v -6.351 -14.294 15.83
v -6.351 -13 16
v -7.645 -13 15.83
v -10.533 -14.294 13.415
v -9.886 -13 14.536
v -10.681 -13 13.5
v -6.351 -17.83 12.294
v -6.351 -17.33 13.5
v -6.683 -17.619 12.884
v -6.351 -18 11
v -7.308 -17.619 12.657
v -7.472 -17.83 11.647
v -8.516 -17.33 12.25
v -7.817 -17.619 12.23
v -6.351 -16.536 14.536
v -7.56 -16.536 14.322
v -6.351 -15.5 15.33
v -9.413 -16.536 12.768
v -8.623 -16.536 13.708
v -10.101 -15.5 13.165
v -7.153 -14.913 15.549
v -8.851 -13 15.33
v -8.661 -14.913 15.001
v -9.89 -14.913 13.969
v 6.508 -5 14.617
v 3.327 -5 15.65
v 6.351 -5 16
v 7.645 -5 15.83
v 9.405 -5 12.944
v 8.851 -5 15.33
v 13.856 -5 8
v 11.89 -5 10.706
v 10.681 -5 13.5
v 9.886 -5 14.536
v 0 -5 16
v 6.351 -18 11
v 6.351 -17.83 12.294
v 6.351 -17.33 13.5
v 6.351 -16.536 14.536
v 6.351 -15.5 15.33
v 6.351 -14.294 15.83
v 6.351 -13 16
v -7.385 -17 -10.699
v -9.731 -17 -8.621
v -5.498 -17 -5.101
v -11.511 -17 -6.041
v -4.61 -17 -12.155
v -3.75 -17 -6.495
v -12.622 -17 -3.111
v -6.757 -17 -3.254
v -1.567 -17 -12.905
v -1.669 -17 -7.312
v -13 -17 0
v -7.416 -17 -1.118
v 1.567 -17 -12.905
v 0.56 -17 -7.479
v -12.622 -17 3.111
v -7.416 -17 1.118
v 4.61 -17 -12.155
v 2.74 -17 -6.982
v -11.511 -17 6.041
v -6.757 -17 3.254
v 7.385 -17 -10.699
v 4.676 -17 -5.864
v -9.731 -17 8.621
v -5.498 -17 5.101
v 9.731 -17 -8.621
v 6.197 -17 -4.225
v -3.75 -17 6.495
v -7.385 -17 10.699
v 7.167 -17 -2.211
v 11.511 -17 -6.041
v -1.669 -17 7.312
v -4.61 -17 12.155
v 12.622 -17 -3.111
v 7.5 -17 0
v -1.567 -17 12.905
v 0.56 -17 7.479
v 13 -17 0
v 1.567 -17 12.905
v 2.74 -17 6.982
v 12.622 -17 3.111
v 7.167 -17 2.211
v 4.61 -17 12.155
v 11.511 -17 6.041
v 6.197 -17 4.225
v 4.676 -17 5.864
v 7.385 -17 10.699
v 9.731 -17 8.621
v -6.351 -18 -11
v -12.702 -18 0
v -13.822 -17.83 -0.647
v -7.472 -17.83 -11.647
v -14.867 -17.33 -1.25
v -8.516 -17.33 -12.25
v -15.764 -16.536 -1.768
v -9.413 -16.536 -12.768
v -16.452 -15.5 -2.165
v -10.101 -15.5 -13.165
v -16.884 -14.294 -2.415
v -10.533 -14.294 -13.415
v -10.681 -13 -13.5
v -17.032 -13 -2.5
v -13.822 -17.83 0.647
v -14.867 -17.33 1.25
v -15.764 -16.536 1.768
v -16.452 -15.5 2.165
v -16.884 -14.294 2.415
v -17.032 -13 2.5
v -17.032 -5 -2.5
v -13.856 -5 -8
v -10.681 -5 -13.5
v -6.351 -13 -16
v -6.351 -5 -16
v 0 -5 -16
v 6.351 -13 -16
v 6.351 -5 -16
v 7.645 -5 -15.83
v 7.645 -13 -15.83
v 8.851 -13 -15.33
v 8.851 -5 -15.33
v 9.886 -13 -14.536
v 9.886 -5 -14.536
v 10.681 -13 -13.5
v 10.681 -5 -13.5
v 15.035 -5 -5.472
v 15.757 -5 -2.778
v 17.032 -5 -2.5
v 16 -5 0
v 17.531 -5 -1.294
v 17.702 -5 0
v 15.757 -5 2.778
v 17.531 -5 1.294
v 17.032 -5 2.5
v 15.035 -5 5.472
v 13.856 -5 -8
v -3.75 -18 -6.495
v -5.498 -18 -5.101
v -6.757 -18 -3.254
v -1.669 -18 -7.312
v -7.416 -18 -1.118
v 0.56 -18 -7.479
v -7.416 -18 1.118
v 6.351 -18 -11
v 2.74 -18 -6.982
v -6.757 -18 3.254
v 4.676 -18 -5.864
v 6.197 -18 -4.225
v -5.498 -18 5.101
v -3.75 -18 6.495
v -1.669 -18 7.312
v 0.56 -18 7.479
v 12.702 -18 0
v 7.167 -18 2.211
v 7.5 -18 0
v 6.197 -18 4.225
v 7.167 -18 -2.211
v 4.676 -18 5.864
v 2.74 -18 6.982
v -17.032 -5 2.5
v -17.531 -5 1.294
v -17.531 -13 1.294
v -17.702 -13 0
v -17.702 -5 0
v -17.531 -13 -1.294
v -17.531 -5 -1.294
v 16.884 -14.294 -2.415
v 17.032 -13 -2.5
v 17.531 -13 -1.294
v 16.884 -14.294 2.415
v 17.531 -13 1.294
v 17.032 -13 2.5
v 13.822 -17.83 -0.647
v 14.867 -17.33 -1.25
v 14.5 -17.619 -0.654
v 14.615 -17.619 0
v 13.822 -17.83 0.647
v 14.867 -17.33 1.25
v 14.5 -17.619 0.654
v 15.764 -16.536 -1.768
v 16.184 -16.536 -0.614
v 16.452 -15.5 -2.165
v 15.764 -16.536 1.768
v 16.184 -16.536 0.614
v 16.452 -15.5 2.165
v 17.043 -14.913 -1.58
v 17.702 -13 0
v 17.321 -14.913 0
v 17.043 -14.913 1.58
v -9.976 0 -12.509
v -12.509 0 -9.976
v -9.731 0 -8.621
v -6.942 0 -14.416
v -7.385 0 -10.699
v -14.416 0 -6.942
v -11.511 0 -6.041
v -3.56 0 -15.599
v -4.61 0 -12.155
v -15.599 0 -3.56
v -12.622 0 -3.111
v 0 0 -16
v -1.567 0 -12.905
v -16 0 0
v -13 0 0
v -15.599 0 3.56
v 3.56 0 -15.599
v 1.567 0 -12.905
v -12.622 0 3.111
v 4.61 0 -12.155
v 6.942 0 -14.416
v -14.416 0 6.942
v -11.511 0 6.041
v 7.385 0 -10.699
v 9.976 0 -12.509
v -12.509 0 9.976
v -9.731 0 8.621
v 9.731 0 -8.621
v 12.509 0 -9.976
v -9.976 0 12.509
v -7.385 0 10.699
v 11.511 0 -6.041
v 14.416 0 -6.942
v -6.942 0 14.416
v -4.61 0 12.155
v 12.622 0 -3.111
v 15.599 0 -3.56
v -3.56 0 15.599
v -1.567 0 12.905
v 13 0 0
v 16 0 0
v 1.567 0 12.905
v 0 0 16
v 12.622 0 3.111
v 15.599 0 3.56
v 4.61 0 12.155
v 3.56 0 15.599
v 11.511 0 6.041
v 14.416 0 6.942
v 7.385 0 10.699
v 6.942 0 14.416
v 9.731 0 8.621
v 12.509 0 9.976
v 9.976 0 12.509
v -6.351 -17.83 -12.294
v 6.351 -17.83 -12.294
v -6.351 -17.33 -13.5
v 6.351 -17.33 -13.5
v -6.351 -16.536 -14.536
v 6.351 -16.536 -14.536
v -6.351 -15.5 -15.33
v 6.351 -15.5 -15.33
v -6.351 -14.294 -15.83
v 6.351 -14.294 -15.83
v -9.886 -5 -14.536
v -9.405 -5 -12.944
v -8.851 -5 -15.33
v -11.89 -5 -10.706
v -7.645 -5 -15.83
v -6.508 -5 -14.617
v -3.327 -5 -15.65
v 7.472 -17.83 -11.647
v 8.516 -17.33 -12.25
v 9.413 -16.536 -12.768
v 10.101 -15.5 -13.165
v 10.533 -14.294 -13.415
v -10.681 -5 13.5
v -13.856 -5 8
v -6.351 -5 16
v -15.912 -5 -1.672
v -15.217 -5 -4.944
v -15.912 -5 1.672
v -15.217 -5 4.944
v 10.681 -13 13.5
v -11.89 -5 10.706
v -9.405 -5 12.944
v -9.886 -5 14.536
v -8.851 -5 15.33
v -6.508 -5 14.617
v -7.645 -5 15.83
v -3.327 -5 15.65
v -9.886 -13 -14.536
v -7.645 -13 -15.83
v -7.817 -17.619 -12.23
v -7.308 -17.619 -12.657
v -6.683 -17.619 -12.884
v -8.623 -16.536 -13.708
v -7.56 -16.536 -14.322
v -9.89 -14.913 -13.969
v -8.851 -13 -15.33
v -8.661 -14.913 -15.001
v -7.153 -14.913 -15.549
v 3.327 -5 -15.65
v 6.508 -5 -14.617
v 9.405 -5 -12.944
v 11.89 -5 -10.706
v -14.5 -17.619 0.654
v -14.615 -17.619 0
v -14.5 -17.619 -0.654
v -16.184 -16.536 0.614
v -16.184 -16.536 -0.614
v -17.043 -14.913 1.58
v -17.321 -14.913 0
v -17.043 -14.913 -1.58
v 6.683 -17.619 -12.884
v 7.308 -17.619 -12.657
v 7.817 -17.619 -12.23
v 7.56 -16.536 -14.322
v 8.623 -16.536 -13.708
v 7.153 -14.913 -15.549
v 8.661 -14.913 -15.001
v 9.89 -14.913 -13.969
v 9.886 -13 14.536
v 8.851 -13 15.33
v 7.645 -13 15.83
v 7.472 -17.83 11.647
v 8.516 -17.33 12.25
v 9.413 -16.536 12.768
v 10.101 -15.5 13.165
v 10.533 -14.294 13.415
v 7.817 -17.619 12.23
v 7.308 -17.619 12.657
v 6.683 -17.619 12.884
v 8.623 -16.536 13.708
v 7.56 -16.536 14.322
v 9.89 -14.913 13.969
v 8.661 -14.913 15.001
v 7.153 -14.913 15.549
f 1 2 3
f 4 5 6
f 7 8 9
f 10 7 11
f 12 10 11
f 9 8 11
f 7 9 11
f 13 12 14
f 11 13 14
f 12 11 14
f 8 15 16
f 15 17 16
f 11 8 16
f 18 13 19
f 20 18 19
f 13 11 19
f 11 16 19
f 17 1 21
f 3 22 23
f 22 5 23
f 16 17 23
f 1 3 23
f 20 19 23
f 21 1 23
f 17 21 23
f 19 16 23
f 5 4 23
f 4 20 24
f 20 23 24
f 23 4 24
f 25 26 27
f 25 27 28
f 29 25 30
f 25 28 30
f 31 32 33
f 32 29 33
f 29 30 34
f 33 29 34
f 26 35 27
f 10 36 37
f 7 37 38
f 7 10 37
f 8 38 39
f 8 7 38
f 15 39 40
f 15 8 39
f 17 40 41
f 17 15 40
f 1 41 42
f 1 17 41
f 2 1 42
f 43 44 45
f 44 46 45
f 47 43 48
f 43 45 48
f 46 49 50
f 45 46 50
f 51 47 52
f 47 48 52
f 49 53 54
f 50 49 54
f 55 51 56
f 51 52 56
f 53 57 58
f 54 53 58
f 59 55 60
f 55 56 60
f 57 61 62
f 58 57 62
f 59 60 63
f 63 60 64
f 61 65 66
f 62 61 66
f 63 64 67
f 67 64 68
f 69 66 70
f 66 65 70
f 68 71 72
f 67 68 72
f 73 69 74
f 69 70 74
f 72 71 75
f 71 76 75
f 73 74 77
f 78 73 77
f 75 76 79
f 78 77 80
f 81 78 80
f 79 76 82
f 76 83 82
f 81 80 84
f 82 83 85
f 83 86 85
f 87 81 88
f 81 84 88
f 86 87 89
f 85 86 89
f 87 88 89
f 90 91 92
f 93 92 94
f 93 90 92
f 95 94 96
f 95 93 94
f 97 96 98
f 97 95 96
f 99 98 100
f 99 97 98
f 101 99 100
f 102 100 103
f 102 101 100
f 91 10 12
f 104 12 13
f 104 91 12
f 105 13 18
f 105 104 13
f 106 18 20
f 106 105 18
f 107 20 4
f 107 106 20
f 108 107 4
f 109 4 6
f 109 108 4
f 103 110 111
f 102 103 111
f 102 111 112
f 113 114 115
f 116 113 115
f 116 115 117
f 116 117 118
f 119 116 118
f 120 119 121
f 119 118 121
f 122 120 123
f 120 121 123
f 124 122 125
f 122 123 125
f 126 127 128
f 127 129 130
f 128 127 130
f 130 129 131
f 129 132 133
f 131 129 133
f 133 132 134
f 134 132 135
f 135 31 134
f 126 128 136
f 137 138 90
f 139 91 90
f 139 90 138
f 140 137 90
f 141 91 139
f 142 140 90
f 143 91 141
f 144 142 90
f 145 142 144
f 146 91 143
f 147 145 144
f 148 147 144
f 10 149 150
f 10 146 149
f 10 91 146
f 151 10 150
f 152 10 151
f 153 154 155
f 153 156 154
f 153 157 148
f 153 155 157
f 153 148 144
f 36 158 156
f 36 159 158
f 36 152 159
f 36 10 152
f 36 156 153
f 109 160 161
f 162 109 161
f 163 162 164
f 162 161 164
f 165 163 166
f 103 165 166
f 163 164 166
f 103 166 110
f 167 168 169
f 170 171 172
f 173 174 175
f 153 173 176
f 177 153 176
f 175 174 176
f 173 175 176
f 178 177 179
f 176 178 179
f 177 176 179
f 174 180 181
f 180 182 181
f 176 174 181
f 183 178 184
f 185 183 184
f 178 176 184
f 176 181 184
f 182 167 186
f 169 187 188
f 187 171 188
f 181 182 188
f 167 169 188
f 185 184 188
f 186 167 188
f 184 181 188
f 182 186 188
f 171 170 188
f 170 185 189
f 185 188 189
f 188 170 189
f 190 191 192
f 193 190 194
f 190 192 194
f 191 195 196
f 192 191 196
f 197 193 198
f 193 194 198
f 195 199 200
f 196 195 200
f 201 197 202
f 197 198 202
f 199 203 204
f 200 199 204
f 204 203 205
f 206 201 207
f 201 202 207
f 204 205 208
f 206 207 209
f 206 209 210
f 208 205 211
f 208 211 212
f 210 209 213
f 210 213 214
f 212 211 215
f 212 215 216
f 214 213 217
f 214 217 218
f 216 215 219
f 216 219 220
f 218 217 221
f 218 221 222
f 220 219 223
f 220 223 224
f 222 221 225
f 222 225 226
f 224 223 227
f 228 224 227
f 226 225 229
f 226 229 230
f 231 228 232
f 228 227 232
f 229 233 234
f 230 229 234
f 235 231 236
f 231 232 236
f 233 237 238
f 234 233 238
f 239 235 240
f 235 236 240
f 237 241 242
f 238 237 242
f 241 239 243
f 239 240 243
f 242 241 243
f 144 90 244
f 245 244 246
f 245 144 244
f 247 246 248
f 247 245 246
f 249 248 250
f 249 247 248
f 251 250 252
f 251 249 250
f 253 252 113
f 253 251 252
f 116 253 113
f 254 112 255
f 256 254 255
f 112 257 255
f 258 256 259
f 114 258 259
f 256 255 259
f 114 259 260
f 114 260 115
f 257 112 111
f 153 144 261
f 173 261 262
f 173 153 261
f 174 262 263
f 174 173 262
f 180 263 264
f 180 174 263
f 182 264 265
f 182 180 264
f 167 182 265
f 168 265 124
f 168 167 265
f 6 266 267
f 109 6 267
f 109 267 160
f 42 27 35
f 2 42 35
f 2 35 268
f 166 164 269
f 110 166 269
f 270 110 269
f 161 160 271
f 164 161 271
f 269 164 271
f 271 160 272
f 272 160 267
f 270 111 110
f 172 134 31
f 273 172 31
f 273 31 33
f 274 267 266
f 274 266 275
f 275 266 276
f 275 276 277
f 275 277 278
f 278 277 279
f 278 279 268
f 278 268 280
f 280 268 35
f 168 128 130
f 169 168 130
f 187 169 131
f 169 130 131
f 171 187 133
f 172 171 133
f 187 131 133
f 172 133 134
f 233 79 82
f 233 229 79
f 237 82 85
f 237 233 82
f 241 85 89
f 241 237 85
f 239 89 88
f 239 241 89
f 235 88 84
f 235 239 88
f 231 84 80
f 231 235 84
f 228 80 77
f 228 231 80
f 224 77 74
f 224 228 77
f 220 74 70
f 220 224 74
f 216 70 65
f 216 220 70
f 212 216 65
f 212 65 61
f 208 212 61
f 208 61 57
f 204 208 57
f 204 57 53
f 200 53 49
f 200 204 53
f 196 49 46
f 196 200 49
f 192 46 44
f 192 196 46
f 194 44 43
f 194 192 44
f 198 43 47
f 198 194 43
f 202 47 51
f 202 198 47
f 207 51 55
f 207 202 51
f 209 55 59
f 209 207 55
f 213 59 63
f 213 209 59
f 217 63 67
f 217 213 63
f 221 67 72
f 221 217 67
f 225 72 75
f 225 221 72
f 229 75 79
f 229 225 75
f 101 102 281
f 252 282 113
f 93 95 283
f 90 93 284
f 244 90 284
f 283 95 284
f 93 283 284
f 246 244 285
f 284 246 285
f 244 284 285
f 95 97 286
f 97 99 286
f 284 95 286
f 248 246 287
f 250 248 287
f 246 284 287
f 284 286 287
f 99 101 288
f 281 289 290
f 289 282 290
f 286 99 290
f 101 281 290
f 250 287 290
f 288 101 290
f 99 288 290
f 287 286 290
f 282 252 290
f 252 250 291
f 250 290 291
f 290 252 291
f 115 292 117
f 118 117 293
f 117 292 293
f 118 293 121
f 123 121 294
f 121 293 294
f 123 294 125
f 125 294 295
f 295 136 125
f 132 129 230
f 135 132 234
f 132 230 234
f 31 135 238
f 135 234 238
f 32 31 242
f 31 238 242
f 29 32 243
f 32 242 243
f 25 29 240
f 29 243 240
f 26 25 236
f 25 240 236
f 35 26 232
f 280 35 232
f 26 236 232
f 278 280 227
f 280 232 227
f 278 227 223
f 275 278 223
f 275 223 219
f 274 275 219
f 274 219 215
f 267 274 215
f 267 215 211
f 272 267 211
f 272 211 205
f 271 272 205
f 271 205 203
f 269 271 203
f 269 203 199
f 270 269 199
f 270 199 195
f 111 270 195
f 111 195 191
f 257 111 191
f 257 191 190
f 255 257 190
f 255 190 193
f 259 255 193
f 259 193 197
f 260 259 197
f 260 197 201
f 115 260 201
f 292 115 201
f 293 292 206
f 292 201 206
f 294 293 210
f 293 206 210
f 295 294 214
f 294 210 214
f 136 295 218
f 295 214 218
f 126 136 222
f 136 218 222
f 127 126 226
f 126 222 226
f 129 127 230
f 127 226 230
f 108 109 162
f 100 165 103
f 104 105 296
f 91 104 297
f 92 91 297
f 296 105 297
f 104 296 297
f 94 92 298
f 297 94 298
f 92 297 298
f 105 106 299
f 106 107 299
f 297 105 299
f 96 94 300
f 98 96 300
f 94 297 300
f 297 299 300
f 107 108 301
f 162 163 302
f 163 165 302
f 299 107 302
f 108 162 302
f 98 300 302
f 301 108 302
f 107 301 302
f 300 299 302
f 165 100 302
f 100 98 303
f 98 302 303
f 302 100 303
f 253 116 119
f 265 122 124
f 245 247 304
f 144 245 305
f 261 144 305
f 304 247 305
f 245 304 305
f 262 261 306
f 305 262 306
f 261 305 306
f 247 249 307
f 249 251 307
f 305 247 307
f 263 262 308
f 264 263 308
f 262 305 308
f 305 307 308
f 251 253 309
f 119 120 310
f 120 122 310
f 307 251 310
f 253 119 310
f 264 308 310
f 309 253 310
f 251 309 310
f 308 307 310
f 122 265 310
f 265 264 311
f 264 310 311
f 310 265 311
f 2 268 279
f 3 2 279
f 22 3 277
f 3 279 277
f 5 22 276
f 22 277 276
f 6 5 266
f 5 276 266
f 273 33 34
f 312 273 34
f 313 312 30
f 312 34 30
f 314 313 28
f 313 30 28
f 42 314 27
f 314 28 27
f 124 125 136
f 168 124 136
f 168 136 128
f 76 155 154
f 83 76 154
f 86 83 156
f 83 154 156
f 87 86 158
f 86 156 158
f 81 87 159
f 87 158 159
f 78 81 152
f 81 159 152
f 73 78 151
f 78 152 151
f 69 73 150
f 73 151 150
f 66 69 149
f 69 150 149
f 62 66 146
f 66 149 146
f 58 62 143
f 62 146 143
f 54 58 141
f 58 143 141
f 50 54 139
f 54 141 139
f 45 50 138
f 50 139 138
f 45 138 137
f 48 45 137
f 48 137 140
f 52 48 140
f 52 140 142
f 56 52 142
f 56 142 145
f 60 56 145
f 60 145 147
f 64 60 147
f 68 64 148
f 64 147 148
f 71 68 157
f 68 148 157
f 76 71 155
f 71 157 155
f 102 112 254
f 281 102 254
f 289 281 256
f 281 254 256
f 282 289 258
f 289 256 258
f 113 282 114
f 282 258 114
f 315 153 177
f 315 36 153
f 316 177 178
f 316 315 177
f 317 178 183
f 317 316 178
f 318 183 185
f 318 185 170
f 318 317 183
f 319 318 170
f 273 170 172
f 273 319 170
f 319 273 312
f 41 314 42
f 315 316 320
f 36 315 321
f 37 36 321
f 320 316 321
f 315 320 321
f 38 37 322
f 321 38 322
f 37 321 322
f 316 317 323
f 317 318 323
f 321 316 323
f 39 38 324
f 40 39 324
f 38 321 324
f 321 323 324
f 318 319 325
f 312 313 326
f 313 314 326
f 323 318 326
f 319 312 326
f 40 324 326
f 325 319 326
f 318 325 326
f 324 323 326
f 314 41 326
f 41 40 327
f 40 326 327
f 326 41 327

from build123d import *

# Parameters (mm, degrees)
F0_R     = 16
F0_R_2   = 13
F1_DEPTH = 5
F2_R     = 13
F3_DEPTH = 13
F4_R     = 7.5
F5_DEPTH = 1
F6_R     = 5


with BuildPart() as f1:
    # F0 (on Front) → F1 (new body)
    with BuildSketch(Plane.XZ):
        Circle(F0_R)
        Circle(F0_R_2, mode=Mode.SUBTRACT)
    extrude(amount=F1_DEPTH)

    # F2 (on face) → F3 (join)
    with BuildSketch(Plane.XZ.offset(5)):
        with BuildLine():
            Line((6.3508529611, 16), (-6.3508529611, 16))
            ThreePointArc((-6.3508529611, 16), (-8.8508529611, 15.3301270189), (-10.68097998, 13.5))
            Line((-10.68097998, 13.5), (-17.0318329411, 2.5))
            ThreePointArc((-17.0318329411, 2.5), (-17.7017059222, 0), (-17.0318329411, -2.5))
            Line((-17.0318329411, -2.5), (-10.68097998, -13.5))
            ThreePointArc((-10.68097998, -13.5), (-8.8508529611, -15.3301270189), (-6.3508529611, -16))
            Line((-6.3508529611, -16), (6.3508529611, -16))
            ThreePointArc((6.3508529611, -16), (8.8508529611, -15.3301270189), (10.68097998, -13.5))
            Line((10.68097998, -13.5), (17.0318329411, -2.5))
            ThreePointArc((17.0318329411, -2.5), (17.7017059222, 0), (17.0318329411, 2.5))
            Line((17.0318329411, 2.5), (10.68097998, 13.5))
            ThreePointArc((10.68097998, 13.5), (8.8508529611, 15.3301270189), (6.3508529611, 16))
        make_face()
        Circle(F2_R, mode=Mode.SUBTRACT)
    extrude(amount=F3_DEPTH)

    # F4 (on face) → F5 (join)
    with BuildSketch(Plane.XZ.offset(18)):
        with BuildLine():
            Line((6.3508529611, 16), (-6.3508529611, 16))
            ThreePointArc((-6.3508529611, 16), (-8.8508529611, 15.3301270189), (-10.68097998, 13.5))
            Line((-10.68097998, 13.5), (-17.0318329411, 2.5))
            ThreePointArc((-17.0318329411, 2.5), (-17.7017059222, 0), (-17.0318329411, -2.5))
            Line((-17.0318329411, -2.5), (-10.68097998, -13.5))
            ThreePointArc((-10.68097998, -13.5), (-8.8508529611, -15.3301270189), (-6.3508529611, -16))
            Line((-6.3508529611, -16), (6.3508529611, -16))
            ThreePointArc((6.3508529611, -16), (8.8508529611, -15.3301270189), (10.68097998, -13.5))
            Line((10.68097998, -13.5), (17.0318329411, -2.5))
            ThreePointArc((17.0318329411, -2.5), (17.7017059222, 0), (17.0318329411, 2.5))
            Line((17.0318329411, 2.5), (10.68097998, 13.5))
            ThreePointArc((10.68097998, 13.5), (8.8508529611, 15.3301270189), (6.3508529611, 16))
        make_face()
        Circle(F4_R, mode=Mode.SUBTRACT)
    extrude(amount=-F5_DEPTH)

    # F6
    f6_edges = [f1.edges().sort_by_distance(p)[0] for p in [
        (13.856406, -18, 8),
    ]]
    fillet(f6_edges, radius=F6_R)


solid = f1.part
